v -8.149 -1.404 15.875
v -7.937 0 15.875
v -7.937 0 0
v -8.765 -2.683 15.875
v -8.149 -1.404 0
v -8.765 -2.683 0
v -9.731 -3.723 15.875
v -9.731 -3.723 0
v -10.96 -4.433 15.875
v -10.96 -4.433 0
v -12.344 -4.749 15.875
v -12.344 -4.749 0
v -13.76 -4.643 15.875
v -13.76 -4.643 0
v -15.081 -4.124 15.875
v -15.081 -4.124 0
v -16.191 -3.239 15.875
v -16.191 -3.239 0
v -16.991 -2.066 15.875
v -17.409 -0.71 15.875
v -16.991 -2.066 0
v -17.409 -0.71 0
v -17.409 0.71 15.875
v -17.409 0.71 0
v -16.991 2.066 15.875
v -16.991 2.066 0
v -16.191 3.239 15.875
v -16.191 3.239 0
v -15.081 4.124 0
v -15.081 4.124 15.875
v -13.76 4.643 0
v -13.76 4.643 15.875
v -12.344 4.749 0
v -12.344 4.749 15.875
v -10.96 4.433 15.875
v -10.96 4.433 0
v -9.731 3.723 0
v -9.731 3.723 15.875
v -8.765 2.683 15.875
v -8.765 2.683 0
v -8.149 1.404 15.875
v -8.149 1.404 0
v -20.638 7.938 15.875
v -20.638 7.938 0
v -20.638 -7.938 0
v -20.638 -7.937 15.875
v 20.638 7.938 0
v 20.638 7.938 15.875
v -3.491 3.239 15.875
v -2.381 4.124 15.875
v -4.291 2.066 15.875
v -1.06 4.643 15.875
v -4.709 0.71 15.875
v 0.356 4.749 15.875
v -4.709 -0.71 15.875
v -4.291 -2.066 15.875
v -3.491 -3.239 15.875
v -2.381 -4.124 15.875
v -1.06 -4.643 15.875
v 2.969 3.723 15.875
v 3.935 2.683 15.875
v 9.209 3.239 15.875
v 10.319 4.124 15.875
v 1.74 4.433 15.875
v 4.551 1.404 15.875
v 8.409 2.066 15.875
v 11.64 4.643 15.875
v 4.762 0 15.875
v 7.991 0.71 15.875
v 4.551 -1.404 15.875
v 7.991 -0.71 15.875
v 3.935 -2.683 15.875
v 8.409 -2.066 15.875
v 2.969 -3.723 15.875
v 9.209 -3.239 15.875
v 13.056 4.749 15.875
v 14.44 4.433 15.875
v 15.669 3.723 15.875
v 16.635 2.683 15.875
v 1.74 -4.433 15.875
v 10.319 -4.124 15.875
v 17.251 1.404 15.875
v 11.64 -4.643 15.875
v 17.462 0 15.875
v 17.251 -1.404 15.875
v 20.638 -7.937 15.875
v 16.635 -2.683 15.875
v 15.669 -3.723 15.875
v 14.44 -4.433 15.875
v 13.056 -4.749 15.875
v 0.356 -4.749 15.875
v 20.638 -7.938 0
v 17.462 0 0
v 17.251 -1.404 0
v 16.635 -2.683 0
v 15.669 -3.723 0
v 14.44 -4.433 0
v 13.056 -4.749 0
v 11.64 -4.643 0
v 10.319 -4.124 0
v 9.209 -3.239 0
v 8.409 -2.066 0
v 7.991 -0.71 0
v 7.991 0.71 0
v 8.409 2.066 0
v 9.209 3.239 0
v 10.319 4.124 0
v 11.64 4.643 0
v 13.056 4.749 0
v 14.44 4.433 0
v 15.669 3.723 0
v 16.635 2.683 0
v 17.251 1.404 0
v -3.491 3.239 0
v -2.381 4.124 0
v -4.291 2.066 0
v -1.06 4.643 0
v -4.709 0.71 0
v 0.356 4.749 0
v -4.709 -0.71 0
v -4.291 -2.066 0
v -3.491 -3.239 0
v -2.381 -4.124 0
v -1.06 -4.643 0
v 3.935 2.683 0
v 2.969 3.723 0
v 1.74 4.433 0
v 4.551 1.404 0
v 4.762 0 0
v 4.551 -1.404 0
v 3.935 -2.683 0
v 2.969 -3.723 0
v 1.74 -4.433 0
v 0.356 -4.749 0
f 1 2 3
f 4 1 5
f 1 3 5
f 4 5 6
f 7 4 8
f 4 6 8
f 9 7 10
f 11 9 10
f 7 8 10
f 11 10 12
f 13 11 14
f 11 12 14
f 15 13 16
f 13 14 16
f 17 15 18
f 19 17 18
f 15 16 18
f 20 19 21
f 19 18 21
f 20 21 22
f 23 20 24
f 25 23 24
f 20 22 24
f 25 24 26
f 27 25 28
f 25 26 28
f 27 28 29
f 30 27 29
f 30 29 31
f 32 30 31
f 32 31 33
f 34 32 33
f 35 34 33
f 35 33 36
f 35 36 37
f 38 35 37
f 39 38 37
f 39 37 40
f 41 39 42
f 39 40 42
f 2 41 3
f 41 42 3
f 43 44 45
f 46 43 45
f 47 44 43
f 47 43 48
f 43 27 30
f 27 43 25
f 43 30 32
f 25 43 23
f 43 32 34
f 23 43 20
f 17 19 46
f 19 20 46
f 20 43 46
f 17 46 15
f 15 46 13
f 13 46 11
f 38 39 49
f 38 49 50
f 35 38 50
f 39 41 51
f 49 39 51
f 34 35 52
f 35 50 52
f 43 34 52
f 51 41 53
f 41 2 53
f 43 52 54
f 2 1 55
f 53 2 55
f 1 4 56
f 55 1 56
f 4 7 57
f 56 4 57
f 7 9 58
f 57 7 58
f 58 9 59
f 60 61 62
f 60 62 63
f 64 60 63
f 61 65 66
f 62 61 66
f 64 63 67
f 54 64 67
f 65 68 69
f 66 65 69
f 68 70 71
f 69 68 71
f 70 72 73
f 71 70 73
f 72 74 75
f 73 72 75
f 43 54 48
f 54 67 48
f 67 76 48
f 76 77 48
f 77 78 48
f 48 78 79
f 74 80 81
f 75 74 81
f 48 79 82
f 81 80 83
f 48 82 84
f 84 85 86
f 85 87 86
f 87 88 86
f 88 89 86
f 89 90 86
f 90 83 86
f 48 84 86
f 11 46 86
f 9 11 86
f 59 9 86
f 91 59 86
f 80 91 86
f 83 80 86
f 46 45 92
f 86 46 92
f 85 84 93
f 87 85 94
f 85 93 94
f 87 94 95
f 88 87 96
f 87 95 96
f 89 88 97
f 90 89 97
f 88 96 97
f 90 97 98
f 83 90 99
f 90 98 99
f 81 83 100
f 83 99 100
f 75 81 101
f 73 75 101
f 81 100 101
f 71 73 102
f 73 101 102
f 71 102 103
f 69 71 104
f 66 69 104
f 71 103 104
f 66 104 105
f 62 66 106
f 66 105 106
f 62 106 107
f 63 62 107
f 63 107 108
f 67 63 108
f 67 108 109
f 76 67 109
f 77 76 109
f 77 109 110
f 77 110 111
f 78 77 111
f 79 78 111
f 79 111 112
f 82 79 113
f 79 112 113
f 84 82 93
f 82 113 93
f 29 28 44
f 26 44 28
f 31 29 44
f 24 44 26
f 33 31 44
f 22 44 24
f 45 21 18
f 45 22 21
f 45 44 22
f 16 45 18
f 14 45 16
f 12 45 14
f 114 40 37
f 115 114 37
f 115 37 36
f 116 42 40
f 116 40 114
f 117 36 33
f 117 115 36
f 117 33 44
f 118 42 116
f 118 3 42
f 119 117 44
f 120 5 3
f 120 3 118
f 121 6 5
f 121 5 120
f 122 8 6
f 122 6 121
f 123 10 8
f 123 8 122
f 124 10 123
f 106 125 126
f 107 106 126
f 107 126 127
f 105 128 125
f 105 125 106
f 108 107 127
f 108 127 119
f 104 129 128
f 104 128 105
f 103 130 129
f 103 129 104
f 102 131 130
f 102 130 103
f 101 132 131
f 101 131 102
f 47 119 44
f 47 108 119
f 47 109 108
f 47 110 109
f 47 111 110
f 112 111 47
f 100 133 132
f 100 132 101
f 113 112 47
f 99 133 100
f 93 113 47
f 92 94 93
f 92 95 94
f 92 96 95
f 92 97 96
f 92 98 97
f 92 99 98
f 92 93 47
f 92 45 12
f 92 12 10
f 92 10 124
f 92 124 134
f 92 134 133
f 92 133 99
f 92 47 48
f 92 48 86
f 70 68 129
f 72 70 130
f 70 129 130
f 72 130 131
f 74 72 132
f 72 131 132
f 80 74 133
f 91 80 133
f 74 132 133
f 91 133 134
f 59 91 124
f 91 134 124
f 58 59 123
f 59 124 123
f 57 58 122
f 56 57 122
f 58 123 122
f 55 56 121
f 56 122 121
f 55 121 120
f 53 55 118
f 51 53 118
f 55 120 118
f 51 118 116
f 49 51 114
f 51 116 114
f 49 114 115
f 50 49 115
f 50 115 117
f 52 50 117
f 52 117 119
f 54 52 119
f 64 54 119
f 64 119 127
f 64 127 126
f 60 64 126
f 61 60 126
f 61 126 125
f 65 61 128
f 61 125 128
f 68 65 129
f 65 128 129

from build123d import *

# Parameters (mm, degrees)
F0_W     = 41.275
F0_H     = 15.875
F0_R     = 4.7625
F1_DEPTH = 15.875
F2_ANGLE = 90


with BuildPart() as f1:
    # F0 (on Front) → F1 (new body)
    with BuildSketch(Plane.XZ):
        Rectangle(F0_W, F0_H)
        with Locations((-12.7, 0)):
            Circle(F0_R, mode=Mode.SUBTRACT)
        Circle(F0_R, mode=Mode.SUBTRACT)
        with Locations((12.7, 0)):
            Circle(F0_R, mode=Mode.SUBTRACT)
    extrude(amount=-F1_DEPTH)


with BuildPart() as f1_1:
    # F2: moved
    add(f1.part.rotate(Axis((6.35, 0, 0), (1, 0, 0)), F2_ANGLE))


solid = f1_1.part
